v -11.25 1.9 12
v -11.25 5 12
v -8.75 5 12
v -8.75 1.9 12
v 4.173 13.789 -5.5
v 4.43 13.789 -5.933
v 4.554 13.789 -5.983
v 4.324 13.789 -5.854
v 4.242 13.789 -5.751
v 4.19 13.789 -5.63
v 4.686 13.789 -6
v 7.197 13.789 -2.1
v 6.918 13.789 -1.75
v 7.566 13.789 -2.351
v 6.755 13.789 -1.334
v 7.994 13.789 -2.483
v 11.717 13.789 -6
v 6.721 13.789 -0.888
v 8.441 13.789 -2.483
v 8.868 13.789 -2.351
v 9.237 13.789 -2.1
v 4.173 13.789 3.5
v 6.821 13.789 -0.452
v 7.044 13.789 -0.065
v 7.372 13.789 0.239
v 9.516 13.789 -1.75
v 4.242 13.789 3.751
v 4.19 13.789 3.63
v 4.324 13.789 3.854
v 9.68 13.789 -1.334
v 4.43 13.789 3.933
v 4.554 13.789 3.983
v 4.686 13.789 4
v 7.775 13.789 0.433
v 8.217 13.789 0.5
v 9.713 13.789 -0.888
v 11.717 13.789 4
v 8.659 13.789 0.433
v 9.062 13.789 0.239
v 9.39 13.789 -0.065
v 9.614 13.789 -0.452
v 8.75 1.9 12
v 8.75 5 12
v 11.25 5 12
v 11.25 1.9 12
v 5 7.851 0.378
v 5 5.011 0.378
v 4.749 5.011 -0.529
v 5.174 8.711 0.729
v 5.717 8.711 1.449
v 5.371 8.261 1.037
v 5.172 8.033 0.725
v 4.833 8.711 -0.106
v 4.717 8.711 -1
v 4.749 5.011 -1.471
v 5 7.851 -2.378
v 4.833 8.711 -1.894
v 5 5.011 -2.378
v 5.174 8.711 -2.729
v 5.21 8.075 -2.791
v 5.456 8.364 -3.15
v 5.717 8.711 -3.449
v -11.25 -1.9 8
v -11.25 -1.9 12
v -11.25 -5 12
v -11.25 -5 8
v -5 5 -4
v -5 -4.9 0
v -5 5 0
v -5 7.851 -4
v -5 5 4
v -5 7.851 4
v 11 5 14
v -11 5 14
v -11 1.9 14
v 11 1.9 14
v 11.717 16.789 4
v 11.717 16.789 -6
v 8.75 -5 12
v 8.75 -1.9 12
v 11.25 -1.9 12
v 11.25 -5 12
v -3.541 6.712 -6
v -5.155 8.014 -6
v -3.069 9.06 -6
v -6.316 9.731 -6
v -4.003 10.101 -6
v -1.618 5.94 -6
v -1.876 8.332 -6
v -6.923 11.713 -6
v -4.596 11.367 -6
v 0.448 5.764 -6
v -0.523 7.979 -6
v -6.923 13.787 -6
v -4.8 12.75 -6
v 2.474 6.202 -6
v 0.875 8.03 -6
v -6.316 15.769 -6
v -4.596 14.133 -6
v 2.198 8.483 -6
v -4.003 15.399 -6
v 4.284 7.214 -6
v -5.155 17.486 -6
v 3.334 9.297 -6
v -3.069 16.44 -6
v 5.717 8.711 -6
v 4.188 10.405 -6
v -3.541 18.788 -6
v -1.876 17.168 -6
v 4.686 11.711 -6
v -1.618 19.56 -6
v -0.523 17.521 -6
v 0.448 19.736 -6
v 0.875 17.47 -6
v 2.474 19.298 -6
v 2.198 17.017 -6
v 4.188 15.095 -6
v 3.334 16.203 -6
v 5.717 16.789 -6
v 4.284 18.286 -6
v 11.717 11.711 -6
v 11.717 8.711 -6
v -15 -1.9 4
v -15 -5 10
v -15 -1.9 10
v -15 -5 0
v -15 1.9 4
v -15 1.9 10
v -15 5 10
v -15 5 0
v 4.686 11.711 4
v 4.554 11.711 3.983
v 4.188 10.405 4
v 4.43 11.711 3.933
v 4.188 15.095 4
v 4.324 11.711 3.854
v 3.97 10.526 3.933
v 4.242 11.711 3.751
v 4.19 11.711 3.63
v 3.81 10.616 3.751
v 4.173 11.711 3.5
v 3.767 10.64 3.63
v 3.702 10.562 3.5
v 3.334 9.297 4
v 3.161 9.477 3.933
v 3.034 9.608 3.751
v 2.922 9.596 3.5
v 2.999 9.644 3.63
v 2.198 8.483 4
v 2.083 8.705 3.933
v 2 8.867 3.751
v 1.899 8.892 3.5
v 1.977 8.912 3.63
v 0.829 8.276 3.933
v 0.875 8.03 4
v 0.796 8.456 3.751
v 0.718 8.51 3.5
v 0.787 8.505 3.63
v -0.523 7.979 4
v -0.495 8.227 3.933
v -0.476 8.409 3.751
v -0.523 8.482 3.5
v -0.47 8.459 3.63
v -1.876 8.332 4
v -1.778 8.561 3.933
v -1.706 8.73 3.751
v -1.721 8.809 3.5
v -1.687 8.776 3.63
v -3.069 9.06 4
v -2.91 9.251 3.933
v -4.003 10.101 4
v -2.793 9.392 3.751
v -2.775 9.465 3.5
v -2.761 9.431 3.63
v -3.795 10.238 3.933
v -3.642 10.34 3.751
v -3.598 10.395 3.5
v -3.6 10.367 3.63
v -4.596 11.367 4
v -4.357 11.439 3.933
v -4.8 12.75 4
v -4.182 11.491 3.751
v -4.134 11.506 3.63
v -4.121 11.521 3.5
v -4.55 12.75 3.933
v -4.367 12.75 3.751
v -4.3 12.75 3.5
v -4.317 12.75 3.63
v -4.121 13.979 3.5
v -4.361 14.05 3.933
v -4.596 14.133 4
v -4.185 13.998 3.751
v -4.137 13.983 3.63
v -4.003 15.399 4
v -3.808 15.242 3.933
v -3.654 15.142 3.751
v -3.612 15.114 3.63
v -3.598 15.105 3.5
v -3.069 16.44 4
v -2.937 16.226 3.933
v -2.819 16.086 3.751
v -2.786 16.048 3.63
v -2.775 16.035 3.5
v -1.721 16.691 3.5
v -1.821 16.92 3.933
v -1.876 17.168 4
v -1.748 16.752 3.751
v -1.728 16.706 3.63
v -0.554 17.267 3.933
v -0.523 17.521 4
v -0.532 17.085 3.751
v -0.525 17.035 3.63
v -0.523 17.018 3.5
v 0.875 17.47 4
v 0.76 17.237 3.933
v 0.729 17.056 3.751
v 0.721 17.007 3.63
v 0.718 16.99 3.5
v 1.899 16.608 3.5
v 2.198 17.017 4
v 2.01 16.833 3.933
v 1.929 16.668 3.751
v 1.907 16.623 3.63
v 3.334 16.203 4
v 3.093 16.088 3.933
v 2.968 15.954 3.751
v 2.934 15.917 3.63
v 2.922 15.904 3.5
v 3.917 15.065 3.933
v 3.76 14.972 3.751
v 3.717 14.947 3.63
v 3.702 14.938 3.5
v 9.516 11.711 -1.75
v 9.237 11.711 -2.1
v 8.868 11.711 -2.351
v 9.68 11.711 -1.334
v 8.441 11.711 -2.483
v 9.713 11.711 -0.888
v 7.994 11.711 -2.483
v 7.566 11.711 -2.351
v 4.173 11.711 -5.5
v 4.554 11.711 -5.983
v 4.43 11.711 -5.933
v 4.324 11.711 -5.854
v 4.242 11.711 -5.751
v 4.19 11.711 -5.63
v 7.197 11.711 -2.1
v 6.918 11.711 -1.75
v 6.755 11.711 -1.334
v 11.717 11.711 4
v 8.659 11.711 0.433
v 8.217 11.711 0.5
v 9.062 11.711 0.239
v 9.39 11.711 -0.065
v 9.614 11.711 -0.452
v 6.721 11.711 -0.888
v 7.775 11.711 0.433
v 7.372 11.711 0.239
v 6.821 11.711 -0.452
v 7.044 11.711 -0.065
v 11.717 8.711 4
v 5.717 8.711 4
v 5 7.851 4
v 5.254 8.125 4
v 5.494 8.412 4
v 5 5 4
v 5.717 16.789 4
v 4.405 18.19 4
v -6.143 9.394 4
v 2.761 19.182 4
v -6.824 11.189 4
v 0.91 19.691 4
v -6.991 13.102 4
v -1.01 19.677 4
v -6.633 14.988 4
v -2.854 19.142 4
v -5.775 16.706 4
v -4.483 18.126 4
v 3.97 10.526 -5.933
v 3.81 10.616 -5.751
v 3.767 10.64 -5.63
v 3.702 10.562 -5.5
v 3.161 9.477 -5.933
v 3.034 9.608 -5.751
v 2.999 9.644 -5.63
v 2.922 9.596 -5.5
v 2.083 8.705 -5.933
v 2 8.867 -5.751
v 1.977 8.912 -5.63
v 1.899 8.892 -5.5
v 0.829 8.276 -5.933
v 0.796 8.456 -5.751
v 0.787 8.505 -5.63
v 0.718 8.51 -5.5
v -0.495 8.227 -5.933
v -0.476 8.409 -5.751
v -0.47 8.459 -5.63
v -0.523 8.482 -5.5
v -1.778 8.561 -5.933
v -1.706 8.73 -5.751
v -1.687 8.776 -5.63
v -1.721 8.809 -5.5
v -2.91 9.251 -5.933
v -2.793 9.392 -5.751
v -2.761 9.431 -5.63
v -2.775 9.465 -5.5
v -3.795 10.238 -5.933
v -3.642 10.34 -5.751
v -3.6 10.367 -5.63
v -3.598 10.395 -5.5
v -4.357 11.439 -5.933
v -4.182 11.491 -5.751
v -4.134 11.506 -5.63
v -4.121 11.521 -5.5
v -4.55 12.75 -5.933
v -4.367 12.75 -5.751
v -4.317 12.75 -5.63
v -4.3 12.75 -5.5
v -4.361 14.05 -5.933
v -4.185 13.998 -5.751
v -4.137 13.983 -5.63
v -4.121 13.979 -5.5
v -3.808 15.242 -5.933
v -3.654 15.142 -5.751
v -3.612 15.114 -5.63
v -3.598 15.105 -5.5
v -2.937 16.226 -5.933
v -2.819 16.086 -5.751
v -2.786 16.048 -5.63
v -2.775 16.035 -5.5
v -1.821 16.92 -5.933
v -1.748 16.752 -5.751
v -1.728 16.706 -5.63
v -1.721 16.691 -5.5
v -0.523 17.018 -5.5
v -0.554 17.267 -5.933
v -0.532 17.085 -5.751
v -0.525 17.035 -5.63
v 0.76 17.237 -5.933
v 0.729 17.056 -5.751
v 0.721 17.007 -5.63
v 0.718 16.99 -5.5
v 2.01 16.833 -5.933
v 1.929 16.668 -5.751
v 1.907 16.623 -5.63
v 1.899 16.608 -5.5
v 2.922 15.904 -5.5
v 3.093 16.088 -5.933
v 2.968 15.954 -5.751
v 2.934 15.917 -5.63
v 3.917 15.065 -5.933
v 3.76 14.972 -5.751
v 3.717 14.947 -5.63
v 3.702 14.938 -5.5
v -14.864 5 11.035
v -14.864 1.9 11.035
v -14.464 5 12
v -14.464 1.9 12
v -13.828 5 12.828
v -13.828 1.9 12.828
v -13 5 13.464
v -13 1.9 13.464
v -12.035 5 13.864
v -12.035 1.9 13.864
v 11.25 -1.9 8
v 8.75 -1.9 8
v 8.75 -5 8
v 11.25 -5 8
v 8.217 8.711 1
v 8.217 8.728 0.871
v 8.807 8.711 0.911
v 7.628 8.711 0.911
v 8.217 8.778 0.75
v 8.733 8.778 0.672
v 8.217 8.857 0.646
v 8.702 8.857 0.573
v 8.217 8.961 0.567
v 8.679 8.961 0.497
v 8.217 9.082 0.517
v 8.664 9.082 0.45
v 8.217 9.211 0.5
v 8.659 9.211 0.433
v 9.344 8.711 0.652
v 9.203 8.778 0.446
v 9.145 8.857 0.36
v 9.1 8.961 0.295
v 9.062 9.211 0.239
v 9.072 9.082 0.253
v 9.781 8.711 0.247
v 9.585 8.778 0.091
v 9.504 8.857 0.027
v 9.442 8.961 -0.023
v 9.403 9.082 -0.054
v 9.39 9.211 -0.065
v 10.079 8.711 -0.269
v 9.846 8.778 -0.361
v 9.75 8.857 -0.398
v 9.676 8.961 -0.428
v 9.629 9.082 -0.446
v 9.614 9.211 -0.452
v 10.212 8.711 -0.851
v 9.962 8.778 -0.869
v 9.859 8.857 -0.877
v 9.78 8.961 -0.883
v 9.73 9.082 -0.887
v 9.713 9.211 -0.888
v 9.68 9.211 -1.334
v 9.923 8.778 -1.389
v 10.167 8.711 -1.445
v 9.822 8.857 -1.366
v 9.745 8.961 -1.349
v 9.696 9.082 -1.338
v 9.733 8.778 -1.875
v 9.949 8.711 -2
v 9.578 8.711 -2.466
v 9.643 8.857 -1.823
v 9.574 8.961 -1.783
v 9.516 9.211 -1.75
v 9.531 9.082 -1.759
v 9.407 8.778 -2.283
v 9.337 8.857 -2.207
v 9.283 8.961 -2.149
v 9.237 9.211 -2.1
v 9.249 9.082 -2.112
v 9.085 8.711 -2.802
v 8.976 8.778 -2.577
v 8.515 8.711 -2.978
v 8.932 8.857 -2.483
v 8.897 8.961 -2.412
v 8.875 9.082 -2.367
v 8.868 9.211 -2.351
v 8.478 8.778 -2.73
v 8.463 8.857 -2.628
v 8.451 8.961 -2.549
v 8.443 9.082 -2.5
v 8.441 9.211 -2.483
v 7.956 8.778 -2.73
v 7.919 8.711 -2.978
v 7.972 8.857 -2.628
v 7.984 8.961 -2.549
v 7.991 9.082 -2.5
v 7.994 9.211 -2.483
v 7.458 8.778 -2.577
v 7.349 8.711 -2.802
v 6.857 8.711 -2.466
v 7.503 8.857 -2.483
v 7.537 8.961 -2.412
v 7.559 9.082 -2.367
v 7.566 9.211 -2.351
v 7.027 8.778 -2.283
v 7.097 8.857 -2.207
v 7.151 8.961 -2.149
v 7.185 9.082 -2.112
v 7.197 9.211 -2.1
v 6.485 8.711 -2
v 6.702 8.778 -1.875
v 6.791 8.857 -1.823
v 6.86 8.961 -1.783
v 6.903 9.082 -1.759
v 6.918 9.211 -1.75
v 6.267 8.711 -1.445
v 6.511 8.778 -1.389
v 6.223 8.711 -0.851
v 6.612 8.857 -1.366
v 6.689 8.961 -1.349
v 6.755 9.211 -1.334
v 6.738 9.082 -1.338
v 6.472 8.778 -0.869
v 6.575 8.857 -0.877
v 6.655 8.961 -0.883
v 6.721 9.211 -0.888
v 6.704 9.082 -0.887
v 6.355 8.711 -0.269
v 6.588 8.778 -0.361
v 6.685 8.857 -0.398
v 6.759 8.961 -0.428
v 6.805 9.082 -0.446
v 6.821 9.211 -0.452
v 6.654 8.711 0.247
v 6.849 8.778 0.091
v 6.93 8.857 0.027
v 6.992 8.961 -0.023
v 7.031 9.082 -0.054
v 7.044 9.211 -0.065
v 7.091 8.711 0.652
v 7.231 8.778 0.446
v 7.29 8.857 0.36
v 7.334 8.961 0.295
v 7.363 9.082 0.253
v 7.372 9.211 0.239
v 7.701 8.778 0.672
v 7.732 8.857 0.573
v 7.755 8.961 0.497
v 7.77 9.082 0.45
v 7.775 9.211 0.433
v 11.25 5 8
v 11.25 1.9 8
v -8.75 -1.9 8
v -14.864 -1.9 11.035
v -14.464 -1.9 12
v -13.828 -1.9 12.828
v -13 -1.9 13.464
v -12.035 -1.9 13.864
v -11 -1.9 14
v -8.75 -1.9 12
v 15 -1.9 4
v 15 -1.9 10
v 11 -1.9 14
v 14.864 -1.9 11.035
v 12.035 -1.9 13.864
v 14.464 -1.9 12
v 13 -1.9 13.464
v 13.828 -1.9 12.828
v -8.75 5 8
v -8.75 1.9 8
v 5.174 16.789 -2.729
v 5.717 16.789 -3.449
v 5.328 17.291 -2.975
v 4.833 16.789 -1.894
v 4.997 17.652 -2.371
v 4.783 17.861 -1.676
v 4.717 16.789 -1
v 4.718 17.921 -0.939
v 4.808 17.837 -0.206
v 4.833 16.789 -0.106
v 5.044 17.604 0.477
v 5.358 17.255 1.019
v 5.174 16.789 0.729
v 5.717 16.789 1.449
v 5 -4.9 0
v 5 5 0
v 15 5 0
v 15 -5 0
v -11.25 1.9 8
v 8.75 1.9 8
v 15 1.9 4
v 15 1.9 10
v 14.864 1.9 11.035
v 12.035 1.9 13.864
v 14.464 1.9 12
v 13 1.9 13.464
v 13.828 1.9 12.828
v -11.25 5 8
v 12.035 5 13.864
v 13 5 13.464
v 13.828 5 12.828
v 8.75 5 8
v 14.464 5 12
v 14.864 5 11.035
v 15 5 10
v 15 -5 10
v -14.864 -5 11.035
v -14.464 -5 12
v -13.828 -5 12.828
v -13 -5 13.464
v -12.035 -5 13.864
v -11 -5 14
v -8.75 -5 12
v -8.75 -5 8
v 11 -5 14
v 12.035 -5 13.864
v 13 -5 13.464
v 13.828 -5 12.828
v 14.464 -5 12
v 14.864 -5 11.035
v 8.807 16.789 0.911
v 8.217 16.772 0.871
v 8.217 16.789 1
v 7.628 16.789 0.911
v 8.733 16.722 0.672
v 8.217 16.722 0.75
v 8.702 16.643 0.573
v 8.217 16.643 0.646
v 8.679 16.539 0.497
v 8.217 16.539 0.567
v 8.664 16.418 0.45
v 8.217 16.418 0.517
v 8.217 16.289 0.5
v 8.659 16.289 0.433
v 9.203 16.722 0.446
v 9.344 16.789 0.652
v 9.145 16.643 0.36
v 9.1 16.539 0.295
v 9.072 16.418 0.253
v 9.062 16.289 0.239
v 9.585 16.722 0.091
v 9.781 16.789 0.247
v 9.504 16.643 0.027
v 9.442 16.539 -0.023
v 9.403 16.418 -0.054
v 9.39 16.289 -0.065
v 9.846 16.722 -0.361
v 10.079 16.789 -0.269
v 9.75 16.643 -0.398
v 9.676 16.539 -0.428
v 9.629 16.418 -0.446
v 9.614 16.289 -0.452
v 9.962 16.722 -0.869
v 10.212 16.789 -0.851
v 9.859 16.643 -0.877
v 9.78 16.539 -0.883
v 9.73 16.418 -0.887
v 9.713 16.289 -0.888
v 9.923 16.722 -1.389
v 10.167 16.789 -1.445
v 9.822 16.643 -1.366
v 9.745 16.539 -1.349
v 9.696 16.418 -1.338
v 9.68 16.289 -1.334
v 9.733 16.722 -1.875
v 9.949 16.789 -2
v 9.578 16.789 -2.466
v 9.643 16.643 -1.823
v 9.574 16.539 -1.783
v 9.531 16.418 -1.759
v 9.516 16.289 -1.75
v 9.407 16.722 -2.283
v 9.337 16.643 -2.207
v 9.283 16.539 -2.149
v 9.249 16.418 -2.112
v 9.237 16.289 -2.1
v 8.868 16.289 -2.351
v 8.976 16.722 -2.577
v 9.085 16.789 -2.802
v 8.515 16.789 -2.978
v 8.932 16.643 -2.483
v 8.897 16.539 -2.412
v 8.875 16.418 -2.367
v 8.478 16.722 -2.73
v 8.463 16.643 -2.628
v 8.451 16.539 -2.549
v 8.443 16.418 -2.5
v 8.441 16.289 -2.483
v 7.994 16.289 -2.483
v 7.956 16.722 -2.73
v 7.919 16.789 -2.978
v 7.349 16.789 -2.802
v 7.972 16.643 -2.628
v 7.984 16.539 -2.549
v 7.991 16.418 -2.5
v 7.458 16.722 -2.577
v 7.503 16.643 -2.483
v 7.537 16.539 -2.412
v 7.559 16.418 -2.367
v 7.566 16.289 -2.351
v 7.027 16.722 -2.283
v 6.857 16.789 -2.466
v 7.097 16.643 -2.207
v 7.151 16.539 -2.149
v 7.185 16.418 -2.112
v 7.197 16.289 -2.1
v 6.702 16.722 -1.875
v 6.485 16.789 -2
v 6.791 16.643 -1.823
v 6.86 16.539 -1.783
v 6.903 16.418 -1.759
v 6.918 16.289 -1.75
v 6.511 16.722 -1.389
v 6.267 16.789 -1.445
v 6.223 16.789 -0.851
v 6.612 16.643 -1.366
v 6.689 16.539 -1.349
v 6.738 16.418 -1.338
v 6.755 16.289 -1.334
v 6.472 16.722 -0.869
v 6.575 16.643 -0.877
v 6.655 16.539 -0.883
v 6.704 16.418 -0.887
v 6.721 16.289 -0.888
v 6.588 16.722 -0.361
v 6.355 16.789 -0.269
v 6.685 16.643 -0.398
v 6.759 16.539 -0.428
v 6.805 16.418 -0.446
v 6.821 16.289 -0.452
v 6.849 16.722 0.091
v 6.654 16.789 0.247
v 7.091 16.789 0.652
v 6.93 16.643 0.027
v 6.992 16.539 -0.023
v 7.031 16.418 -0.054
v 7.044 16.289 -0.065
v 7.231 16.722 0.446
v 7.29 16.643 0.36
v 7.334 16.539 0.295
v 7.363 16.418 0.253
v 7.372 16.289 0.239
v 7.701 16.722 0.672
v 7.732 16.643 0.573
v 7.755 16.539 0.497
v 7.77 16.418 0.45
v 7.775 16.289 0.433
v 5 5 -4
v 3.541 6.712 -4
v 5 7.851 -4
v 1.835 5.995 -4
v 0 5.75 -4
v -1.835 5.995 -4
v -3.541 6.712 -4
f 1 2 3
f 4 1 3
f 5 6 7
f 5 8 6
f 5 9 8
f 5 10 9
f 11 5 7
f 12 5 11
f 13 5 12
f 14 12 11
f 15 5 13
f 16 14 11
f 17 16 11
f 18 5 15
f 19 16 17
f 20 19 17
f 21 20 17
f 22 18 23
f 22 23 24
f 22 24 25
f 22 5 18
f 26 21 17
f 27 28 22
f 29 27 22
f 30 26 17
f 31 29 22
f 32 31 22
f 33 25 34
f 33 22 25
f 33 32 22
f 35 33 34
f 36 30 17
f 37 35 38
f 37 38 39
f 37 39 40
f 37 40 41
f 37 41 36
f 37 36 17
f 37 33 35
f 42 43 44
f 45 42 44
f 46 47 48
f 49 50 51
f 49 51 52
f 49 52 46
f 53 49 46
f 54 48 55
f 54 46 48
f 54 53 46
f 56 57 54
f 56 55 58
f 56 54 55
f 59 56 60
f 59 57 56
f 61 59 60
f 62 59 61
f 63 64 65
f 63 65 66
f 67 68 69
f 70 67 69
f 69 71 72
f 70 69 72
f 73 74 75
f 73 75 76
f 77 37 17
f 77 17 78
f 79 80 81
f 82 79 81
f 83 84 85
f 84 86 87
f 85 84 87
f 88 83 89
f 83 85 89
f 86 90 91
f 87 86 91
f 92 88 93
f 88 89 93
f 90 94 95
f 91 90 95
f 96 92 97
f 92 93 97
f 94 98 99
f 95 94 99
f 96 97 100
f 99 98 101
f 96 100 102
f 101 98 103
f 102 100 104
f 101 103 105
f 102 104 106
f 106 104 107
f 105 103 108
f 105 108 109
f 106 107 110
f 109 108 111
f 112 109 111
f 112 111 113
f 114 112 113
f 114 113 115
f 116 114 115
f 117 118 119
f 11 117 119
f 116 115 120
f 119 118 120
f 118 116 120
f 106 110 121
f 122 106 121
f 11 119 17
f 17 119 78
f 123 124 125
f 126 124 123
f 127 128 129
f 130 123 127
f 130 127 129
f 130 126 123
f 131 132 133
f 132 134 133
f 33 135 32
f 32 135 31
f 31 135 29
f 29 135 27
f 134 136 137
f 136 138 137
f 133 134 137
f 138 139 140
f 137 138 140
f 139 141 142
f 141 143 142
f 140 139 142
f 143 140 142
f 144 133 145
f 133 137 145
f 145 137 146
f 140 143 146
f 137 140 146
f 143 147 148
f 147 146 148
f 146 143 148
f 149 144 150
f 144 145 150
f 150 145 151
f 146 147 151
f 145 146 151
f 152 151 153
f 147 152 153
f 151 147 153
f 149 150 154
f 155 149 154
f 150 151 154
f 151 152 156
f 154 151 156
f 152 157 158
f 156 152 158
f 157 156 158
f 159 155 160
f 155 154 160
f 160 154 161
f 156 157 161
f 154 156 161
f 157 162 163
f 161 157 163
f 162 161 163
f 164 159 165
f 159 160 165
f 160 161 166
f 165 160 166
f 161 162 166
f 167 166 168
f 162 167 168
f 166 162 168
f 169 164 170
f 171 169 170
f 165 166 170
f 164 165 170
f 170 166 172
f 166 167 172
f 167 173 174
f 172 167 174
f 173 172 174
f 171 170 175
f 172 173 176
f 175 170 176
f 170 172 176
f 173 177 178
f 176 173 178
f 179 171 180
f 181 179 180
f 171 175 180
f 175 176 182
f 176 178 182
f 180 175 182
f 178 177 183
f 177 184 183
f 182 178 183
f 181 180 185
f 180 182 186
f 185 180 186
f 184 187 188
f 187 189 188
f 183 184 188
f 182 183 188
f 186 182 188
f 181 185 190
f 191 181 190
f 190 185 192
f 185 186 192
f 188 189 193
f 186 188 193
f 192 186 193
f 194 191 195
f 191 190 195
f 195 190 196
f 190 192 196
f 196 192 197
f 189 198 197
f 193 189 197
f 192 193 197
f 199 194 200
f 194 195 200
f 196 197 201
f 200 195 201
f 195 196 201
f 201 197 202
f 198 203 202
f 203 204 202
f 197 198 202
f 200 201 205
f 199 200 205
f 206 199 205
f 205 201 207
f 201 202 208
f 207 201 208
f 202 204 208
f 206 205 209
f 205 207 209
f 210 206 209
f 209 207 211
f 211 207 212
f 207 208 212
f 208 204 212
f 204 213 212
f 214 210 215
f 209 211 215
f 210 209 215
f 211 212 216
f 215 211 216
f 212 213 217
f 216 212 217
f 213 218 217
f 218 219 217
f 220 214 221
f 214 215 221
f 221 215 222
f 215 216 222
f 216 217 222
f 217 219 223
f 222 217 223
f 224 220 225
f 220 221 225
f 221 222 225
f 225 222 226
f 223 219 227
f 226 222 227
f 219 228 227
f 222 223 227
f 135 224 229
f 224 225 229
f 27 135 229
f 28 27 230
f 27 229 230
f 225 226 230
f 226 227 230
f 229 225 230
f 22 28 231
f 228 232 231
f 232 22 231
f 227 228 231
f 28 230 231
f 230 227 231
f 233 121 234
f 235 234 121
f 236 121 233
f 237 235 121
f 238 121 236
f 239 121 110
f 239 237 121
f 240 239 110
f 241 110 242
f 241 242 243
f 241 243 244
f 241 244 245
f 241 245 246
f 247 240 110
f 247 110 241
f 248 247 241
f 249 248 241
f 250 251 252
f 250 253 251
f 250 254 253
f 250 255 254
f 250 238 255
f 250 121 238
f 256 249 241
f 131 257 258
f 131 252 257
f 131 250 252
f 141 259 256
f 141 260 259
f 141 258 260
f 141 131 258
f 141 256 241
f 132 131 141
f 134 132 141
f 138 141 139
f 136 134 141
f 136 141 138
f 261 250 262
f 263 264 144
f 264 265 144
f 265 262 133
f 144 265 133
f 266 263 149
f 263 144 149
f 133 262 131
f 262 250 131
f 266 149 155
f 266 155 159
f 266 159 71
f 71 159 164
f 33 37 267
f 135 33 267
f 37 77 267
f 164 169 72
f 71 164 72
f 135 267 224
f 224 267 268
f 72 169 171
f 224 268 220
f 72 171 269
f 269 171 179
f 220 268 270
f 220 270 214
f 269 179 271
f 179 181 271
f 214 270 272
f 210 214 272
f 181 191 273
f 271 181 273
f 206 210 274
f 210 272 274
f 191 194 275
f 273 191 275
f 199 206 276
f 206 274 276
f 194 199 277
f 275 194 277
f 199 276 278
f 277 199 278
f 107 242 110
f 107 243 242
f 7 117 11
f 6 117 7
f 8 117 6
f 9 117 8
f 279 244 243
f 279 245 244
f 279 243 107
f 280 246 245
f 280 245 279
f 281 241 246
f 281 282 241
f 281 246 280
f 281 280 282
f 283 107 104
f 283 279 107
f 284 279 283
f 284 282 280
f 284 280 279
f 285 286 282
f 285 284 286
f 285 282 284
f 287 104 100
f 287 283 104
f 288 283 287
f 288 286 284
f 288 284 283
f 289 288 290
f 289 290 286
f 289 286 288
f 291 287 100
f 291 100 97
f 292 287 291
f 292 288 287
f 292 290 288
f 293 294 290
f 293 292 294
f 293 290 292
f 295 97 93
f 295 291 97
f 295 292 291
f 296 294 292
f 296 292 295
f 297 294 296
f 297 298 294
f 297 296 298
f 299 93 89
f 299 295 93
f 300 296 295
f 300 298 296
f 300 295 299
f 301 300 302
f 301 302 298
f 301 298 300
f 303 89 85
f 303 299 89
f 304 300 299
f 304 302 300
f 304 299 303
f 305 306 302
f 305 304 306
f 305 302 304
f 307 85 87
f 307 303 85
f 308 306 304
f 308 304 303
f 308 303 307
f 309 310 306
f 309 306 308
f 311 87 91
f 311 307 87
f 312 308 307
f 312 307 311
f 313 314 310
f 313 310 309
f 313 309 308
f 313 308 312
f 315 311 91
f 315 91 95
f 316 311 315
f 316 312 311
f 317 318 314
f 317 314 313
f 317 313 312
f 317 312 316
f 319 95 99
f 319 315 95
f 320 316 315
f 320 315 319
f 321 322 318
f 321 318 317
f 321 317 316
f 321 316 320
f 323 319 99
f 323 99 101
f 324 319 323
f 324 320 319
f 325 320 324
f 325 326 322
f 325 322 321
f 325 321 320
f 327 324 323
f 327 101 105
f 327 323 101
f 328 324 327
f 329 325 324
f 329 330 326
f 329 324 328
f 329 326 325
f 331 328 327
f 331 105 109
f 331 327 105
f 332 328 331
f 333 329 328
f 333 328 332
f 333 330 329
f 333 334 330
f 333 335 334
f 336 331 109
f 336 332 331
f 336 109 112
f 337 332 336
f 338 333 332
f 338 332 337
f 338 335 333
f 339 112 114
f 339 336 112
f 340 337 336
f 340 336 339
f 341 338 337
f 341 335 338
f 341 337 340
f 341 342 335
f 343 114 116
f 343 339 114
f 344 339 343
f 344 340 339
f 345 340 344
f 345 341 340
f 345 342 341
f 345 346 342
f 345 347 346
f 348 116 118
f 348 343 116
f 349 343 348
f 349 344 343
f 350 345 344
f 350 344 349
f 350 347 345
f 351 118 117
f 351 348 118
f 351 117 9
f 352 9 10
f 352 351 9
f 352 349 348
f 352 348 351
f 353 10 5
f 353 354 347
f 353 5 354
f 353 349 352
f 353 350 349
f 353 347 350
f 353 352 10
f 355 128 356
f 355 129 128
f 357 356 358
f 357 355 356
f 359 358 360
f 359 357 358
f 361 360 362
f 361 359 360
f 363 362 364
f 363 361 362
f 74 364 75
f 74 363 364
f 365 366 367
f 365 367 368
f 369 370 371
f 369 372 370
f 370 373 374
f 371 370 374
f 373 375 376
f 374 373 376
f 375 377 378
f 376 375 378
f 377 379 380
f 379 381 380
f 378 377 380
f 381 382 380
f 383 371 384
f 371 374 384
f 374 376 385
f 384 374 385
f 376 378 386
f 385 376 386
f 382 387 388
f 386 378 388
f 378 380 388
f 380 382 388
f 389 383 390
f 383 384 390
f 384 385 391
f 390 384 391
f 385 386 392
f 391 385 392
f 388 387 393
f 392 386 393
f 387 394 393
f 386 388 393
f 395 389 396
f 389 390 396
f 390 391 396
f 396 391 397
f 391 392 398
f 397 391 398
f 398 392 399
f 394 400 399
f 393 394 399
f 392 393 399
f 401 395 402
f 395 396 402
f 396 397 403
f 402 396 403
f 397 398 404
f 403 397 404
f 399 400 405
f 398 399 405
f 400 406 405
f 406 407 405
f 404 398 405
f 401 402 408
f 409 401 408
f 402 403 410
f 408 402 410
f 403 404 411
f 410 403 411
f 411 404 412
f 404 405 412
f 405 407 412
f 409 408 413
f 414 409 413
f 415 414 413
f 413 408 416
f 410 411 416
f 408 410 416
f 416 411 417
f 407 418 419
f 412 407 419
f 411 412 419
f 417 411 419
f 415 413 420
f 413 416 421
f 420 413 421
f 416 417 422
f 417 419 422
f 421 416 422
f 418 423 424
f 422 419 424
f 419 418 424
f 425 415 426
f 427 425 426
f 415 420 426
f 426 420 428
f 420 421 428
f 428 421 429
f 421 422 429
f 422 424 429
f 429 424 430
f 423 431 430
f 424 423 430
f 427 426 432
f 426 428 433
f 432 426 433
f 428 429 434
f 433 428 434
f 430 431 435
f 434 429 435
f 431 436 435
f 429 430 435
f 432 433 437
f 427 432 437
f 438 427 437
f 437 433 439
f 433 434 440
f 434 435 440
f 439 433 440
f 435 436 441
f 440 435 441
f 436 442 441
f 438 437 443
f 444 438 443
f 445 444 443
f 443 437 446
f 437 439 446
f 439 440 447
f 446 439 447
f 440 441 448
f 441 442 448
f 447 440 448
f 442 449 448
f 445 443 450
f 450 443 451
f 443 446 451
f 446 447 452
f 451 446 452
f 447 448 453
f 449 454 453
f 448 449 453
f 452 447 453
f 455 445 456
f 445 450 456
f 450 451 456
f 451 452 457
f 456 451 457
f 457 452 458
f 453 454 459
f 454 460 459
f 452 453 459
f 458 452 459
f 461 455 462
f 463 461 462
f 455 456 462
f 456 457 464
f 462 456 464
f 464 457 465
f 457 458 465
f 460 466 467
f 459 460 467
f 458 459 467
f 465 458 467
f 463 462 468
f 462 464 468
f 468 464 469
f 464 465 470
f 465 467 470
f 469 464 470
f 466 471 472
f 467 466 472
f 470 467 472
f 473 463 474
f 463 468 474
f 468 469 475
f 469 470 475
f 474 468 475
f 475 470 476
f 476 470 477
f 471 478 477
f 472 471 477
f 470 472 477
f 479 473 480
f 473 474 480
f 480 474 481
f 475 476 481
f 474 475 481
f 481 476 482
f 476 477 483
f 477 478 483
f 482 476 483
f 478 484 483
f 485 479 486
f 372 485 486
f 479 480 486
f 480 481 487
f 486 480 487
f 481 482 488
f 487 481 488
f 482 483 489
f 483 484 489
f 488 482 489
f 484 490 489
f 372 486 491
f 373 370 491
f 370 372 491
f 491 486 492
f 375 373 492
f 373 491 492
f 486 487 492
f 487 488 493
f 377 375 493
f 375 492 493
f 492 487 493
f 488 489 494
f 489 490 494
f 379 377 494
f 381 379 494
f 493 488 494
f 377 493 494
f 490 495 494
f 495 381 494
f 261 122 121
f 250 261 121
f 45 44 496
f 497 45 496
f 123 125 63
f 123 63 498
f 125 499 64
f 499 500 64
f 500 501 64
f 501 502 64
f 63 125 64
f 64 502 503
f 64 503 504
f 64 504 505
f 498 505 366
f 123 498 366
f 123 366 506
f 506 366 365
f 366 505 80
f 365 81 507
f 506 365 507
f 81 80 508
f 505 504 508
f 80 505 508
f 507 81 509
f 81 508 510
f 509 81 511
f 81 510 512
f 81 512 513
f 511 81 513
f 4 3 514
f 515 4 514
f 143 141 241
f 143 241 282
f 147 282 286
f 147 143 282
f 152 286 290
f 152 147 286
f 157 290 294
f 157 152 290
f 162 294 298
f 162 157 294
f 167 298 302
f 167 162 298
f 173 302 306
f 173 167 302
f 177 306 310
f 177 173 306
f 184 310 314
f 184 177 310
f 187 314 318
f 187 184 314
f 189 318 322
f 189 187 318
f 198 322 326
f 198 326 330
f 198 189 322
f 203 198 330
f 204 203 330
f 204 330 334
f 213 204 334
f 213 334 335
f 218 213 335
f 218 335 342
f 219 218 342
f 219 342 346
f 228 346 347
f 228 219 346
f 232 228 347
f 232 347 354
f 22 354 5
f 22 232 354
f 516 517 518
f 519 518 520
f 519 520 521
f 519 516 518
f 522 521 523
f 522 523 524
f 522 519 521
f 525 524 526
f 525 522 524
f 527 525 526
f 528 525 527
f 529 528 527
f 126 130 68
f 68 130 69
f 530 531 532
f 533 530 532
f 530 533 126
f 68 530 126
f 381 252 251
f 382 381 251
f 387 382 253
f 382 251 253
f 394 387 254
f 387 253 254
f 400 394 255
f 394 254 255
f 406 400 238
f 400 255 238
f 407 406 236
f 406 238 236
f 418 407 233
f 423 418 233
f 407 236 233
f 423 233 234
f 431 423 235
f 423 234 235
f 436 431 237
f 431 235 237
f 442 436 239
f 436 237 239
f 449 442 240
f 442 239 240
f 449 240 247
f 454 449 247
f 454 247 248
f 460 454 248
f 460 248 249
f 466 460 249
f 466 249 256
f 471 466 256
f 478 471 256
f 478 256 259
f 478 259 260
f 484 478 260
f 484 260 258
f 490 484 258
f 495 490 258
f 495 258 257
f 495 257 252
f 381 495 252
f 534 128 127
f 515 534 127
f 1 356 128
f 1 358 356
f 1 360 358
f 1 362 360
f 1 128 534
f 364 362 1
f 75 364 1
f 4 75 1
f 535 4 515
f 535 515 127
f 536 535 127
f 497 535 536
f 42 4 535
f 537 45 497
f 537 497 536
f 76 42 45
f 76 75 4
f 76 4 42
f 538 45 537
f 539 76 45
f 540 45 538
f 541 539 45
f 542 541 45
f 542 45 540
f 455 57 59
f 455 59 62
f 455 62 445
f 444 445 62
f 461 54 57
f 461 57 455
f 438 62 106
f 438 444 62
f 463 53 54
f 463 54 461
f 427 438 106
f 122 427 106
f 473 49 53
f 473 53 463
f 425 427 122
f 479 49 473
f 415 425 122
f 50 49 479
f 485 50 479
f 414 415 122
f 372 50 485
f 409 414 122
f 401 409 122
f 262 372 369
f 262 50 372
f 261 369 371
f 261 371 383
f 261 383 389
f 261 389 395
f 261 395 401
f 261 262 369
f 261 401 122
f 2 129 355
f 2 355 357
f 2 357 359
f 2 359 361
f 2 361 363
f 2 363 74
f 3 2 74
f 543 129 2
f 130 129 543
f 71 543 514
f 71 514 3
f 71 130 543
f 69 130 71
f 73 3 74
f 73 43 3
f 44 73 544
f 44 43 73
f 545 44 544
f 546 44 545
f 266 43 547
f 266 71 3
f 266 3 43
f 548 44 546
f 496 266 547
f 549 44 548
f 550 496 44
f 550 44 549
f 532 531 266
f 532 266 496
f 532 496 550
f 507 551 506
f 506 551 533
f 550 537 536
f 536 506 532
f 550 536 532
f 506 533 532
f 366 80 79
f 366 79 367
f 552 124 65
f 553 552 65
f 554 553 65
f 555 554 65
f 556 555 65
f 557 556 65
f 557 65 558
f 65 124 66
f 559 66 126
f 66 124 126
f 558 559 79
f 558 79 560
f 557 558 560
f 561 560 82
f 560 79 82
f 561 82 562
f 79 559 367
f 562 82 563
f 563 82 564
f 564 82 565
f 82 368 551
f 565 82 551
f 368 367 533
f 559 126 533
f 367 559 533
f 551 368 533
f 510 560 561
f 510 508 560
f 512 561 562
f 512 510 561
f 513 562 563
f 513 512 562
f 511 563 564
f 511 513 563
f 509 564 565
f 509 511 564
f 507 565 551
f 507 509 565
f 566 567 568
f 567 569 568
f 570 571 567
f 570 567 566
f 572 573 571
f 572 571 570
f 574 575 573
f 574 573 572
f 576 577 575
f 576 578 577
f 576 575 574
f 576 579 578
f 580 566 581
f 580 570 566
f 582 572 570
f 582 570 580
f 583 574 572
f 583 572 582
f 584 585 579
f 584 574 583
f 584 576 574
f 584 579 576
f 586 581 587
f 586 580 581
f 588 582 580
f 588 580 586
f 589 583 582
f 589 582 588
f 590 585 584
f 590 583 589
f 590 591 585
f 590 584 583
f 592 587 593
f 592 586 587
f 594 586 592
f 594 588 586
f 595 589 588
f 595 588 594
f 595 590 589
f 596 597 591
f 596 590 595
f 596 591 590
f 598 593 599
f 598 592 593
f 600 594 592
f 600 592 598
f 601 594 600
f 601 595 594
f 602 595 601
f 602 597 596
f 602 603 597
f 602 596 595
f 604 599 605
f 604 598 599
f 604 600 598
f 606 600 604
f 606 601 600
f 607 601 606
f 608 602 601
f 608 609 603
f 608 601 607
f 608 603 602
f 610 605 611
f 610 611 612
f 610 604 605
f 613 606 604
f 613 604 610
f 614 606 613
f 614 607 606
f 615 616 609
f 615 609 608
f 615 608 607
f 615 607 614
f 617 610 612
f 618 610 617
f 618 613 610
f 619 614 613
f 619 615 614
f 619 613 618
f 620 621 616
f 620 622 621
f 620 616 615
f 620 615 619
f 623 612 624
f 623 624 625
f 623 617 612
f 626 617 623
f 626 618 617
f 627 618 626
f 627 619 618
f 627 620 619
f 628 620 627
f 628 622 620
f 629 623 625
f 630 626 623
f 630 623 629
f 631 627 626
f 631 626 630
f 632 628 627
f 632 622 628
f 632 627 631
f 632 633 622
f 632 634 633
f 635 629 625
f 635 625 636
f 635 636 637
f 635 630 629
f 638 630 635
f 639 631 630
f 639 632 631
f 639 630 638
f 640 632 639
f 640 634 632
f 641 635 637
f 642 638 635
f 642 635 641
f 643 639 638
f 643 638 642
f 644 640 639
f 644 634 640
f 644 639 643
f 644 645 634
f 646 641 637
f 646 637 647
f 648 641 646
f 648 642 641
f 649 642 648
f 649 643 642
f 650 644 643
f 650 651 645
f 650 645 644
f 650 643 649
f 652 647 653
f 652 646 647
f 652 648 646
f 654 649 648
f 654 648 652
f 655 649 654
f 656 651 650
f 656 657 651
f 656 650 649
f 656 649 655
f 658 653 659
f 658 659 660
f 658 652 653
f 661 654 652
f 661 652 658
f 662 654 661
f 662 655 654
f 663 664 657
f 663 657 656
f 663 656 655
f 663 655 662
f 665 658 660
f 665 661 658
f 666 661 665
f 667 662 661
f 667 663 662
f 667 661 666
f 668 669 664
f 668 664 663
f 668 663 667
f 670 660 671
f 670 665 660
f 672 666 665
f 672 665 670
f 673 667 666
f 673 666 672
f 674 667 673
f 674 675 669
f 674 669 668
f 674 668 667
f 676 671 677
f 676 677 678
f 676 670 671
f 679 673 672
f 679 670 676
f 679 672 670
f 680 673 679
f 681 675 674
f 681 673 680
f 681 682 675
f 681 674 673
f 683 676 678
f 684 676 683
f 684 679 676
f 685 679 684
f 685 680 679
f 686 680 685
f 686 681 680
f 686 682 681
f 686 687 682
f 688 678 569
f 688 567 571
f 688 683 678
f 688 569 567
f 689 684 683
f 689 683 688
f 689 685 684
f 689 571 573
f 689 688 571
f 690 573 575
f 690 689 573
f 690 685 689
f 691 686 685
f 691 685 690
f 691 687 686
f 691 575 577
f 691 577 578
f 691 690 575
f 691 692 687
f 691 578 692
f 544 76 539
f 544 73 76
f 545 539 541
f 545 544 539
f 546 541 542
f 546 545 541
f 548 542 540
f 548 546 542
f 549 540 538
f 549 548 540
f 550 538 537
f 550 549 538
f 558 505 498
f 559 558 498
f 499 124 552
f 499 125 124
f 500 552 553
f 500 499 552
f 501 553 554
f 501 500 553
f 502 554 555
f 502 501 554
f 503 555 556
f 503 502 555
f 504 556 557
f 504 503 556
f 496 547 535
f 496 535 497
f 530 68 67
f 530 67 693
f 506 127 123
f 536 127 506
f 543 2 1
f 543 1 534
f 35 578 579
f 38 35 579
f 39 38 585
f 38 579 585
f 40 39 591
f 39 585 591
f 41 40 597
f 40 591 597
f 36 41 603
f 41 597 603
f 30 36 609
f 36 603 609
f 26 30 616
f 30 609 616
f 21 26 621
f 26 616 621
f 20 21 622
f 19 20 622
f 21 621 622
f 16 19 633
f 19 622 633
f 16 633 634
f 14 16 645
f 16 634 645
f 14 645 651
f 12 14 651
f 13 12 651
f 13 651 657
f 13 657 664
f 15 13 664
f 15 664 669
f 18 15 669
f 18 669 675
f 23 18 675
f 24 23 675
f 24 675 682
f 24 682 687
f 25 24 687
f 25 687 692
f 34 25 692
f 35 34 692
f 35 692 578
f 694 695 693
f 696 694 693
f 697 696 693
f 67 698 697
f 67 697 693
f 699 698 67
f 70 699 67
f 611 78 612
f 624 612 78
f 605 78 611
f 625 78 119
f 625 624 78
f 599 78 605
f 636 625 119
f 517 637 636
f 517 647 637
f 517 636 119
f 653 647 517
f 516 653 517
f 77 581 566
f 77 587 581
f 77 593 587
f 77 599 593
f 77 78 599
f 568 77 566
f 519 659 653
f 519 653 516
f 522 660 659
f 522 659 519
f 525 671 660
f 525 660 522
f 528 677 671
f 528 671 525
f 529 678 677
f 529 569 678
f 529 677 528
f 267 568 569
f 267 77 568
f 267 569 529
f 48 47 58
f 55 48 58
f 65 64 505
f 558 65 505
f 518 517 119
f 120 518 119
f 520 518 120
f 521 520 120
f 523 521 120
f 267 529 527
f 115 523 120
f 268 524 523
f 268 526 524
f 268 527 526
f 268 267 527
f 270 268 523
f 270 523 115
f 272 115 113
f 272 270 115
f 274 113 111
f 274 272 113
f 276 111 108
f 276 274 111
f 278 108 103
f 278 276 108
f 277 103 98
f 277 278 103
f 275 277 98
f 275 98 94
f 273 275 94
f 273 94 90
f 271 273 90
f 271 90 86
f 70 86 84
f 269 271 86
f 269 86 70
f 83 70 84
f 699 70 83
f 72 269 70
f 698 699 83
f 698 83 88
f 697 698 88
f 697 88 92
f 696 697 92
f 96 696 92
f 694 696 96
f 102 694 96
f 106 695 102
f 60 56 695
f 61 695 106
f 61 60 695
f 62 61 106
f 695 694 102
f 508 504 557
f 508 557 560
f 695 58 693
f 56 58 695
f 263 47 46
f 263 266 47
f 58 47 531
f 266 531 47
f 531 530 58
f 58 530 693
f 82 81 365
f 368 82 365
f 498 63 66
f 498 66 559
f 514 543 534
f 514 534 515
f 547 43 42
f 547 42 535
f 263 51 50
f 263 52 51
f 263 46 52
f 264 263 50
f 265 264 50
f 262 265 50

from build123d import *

# Parameters (mm, degrees)
ESBO_O1_W                     = 30
ESBO_O1_H                     = 10
RESSALTO_EXTRUS_O1_DEPTH      = 14
ESBO_O2_W                     = 30
ESBO_O2_H                     = 3.8
CORTE_EXTRUS_O1_DEPTH         = 10
FILETE1_R                     = 4
ESBO_O3_W                     = 2.5
ESBO_O3_H                     = 4
CORTE_EXTRUS_O2_DEPTH         = 23.825424421
RESSALTO_EXTRUS_O2_DEPTH      = 6
RESSALTO_EXTRUS_O2_DEPTH_BACK = 4
ESBO_O5_W                     = 10
ESBO_O5_H                     = 2.851020514
RESSALTO_EXTRUS_O3_DEPTH      = 8
CHANFRO1_SIZE2                = 9.900347414
CHANFRO1_SIZE                 = 4
CORTE_EXTRUS_O3_REACH         = 31.929
ESBO_O7_R                     = 1.5
FILETE2_R                     = 0.5
ESBO_O8_R                     = 3.5
CORTE_EXTRUS_O4_DEPTH         = 15
ESBO_O9_R                     = 3.5
CORTE_EXTRUS_O5_DEPTH         = 3.7


with BuildPart() as part:
    # Esboço1 → Ressalto-extrusão1 (new body)
    with BuildSketch(Plane.XY):
        Rectangle(ESBO_O1_W, ESBO_O1_H)
    extrude(amount=RESSALTO_EXTRUS_O1_DEPTH)

    # Esboço2 → Corte-extrusão1 (cut)
    with BuildSketch(Plane.XY.offset(14)):
        Rectangle(ESBO_O2_W, ESBO_O2_H)
    extrude(amount=-CORTE_EXTRUS_O1_DEPTH, mode=Mode.SUBTRACT)

    # Filete1
    filete1_edges = [part.edges().sort_by_distance(p)[0] for p in [
        (-15, 3.45, 14),
        (15, 3.45, 14),
        (-15, -3.45, 14),
        (15, -3.45, 14),
    ]]
    fillet(filete1_edges, radius=FILETE1_R)

    # Esboço3 → Corte-extrusão2 (cut, through all)
    with BuildSketch(Plane(origin=(0, 5, 0), x_dir=(1, 0, 0), z_dir=(0, 1, 0))):
        with Locations((10, -10)):
            Rectangle(ESBO_O3_W, ESBO_O3_H)
        with Locations((-10, -10)):
            Rectangle(ESBO_O3_W, ESBO_O3_H)
    extrude(amount=-CORTE_EXTRUS_O2_DEPTH, mode=Mode.SUBTRACT)


with BuildPart() as body_2:
    # Esboço4 → Ressalto-extrusão2 (new, two sides: drawn at the far end of the back side and taken through both)
    with BuildSketch(Plane(origin=(0, 0, 0), x_dir=(-1, 0, 0), z_dir=(0, 0, -1)).offset(-RESSALTO_EXTRUS_O2_DEPTH_BACK)):
        with BuildLine():
            Line((-4.17258046, 13.789024691), (-11.717191579, 13.789024691))
            Line((-11.717191579, 13.789024691), (-11.717191579, 16.789024691))
            Line((-11.717191579, 16.789024691), (-5.717191579, 16.789024691))
            ThreePointArc((-5.717191579, 16.789024691), (7, 12.75), (-5.717191579, 8.710975309))
            Line((-5.717191579, 8.710975309), (-11.717191579, 8.710975309))
            Line((-11.717191579, 8.710975309), (-11.717191579, 11.710975309))
            Line((-11.717191579, 11.710975309), (-4.17258046, 11.710975309))
            ThreePointArc((-4.17258046, 11.710975309), (4.3, 12.75), (-4.17258046, 13.789024691))
        make_face()
    extrude(amount=RESSALTO_EXTRUS_O2_DEPTH + RESSALTO_EXTRUS_O2_DEPTH_BACK)

    # Esboço5 → Ressalto-extrusão3 (add)
    with BuildSketch(Plane(origin=(0, 0, 4), x_dir=(-1, 0, 0), z_dir=(0, 0, -1))):
        with Locations((0, 6.425510257)):
            Rectangle(ESBO_O5_W, ESBO_O5_H)
    extrude(amount=RESSALTO_EXTRUS_O3_DEPTH)

    # Combinar1: union part
    add(part.part)

    # Chanfro1
    chanfro1_edges = [body_2.edges().sort_by_distance(p)[0] for p in [
        (0, 5, 0),
    ]]
    chanfro1_side = [body_2.faces().sort_by_distance(p)[0] for p in [
        (0, 5, -0.08),
    ]]
    chamfer(chanfro1_edges, length=CHANFRO1_SIZE - 0.0001, length2=CHANFRO1_SIZE2 - 0.0001, reference=chanfro1_side[0])  # a hair under: the kernel refuses the full size

    # Corte-extrusão3: up to this face of the body (flat: up to its plane)
    corte_extrus_o3_end = Plane(body_2.part.faces().sort_by_distance((8.717191579, 8.710975309, -1))[0])
    # Esboço7 → Corte-extrusão3 (cut, up to the picked face)
    with BuildSketch(Plane(origin=(0, 16.789024691, 0), x_dir=(1, 0, 0), z_dir=(0, 1, 0)), mode=Mode.PRIVATE) as corte_extrus_o3_sk1:
        with Locations(Location((8.217191579, 1, 0), (0, 0, 270))):
            Circle(ESBO_O7_R)
    corte_extrus_o3_tool1 = split(extrude(corte_extrus_o3_sk1.sketch, amount=-CORTE_EXTRUS_O3_REACH, mode=Mode.PRIVATE), bisect_by=corte_extrus_o3_end, keep=Keep.BOTH, mode=Mode.PRIVATE)
    add(corte_extrus_o3_tool1.solids().sort_by(Axis((8.217192, 16.789025, -1), (0, -1, 0)))[0], mode=Mode.SUBTRACT)

    # Filete2
    filete2_edges = [body_2.edges().sort_by_distance(p)[0] for p in [
        (8.217191579, 16.789024691, -2.5),
        (8.217191579, 8.710975309, -2.5),
        (-4.3, 12.75, -6),
        (-4.3, 12.75, 4),
    ]]
    fillet(filete2_edges, radius=FILETE2_R)

    # Esboço8 → Corte-extrusão4 (cut)
    with BuildSketch(Plane(origin=(0, 16.789024691, 0), x_dir=(1, 0, 0), z_dir=(0, 1, 0))):
        with Locations((8.217191579, 1)):
            Circle(ESBO_O8_R)
    extrude(amount=CORTE_EXTRUS_O4_DEPTH, mode=Mode.SUBTRACT)

    # Esboço9 → Corte-extrusão5 (cut)
    with BuildSketch(Plane.XZ.offset(-8.710975309)):
        with Locations((8.217191579, -1)):
            Circle(ESBO_O9_R)
    extrude(amount=CORTE_EXTRUS_O5_DEPTH, mode=Mode.SUBTRACT)


solid = body_2.part
